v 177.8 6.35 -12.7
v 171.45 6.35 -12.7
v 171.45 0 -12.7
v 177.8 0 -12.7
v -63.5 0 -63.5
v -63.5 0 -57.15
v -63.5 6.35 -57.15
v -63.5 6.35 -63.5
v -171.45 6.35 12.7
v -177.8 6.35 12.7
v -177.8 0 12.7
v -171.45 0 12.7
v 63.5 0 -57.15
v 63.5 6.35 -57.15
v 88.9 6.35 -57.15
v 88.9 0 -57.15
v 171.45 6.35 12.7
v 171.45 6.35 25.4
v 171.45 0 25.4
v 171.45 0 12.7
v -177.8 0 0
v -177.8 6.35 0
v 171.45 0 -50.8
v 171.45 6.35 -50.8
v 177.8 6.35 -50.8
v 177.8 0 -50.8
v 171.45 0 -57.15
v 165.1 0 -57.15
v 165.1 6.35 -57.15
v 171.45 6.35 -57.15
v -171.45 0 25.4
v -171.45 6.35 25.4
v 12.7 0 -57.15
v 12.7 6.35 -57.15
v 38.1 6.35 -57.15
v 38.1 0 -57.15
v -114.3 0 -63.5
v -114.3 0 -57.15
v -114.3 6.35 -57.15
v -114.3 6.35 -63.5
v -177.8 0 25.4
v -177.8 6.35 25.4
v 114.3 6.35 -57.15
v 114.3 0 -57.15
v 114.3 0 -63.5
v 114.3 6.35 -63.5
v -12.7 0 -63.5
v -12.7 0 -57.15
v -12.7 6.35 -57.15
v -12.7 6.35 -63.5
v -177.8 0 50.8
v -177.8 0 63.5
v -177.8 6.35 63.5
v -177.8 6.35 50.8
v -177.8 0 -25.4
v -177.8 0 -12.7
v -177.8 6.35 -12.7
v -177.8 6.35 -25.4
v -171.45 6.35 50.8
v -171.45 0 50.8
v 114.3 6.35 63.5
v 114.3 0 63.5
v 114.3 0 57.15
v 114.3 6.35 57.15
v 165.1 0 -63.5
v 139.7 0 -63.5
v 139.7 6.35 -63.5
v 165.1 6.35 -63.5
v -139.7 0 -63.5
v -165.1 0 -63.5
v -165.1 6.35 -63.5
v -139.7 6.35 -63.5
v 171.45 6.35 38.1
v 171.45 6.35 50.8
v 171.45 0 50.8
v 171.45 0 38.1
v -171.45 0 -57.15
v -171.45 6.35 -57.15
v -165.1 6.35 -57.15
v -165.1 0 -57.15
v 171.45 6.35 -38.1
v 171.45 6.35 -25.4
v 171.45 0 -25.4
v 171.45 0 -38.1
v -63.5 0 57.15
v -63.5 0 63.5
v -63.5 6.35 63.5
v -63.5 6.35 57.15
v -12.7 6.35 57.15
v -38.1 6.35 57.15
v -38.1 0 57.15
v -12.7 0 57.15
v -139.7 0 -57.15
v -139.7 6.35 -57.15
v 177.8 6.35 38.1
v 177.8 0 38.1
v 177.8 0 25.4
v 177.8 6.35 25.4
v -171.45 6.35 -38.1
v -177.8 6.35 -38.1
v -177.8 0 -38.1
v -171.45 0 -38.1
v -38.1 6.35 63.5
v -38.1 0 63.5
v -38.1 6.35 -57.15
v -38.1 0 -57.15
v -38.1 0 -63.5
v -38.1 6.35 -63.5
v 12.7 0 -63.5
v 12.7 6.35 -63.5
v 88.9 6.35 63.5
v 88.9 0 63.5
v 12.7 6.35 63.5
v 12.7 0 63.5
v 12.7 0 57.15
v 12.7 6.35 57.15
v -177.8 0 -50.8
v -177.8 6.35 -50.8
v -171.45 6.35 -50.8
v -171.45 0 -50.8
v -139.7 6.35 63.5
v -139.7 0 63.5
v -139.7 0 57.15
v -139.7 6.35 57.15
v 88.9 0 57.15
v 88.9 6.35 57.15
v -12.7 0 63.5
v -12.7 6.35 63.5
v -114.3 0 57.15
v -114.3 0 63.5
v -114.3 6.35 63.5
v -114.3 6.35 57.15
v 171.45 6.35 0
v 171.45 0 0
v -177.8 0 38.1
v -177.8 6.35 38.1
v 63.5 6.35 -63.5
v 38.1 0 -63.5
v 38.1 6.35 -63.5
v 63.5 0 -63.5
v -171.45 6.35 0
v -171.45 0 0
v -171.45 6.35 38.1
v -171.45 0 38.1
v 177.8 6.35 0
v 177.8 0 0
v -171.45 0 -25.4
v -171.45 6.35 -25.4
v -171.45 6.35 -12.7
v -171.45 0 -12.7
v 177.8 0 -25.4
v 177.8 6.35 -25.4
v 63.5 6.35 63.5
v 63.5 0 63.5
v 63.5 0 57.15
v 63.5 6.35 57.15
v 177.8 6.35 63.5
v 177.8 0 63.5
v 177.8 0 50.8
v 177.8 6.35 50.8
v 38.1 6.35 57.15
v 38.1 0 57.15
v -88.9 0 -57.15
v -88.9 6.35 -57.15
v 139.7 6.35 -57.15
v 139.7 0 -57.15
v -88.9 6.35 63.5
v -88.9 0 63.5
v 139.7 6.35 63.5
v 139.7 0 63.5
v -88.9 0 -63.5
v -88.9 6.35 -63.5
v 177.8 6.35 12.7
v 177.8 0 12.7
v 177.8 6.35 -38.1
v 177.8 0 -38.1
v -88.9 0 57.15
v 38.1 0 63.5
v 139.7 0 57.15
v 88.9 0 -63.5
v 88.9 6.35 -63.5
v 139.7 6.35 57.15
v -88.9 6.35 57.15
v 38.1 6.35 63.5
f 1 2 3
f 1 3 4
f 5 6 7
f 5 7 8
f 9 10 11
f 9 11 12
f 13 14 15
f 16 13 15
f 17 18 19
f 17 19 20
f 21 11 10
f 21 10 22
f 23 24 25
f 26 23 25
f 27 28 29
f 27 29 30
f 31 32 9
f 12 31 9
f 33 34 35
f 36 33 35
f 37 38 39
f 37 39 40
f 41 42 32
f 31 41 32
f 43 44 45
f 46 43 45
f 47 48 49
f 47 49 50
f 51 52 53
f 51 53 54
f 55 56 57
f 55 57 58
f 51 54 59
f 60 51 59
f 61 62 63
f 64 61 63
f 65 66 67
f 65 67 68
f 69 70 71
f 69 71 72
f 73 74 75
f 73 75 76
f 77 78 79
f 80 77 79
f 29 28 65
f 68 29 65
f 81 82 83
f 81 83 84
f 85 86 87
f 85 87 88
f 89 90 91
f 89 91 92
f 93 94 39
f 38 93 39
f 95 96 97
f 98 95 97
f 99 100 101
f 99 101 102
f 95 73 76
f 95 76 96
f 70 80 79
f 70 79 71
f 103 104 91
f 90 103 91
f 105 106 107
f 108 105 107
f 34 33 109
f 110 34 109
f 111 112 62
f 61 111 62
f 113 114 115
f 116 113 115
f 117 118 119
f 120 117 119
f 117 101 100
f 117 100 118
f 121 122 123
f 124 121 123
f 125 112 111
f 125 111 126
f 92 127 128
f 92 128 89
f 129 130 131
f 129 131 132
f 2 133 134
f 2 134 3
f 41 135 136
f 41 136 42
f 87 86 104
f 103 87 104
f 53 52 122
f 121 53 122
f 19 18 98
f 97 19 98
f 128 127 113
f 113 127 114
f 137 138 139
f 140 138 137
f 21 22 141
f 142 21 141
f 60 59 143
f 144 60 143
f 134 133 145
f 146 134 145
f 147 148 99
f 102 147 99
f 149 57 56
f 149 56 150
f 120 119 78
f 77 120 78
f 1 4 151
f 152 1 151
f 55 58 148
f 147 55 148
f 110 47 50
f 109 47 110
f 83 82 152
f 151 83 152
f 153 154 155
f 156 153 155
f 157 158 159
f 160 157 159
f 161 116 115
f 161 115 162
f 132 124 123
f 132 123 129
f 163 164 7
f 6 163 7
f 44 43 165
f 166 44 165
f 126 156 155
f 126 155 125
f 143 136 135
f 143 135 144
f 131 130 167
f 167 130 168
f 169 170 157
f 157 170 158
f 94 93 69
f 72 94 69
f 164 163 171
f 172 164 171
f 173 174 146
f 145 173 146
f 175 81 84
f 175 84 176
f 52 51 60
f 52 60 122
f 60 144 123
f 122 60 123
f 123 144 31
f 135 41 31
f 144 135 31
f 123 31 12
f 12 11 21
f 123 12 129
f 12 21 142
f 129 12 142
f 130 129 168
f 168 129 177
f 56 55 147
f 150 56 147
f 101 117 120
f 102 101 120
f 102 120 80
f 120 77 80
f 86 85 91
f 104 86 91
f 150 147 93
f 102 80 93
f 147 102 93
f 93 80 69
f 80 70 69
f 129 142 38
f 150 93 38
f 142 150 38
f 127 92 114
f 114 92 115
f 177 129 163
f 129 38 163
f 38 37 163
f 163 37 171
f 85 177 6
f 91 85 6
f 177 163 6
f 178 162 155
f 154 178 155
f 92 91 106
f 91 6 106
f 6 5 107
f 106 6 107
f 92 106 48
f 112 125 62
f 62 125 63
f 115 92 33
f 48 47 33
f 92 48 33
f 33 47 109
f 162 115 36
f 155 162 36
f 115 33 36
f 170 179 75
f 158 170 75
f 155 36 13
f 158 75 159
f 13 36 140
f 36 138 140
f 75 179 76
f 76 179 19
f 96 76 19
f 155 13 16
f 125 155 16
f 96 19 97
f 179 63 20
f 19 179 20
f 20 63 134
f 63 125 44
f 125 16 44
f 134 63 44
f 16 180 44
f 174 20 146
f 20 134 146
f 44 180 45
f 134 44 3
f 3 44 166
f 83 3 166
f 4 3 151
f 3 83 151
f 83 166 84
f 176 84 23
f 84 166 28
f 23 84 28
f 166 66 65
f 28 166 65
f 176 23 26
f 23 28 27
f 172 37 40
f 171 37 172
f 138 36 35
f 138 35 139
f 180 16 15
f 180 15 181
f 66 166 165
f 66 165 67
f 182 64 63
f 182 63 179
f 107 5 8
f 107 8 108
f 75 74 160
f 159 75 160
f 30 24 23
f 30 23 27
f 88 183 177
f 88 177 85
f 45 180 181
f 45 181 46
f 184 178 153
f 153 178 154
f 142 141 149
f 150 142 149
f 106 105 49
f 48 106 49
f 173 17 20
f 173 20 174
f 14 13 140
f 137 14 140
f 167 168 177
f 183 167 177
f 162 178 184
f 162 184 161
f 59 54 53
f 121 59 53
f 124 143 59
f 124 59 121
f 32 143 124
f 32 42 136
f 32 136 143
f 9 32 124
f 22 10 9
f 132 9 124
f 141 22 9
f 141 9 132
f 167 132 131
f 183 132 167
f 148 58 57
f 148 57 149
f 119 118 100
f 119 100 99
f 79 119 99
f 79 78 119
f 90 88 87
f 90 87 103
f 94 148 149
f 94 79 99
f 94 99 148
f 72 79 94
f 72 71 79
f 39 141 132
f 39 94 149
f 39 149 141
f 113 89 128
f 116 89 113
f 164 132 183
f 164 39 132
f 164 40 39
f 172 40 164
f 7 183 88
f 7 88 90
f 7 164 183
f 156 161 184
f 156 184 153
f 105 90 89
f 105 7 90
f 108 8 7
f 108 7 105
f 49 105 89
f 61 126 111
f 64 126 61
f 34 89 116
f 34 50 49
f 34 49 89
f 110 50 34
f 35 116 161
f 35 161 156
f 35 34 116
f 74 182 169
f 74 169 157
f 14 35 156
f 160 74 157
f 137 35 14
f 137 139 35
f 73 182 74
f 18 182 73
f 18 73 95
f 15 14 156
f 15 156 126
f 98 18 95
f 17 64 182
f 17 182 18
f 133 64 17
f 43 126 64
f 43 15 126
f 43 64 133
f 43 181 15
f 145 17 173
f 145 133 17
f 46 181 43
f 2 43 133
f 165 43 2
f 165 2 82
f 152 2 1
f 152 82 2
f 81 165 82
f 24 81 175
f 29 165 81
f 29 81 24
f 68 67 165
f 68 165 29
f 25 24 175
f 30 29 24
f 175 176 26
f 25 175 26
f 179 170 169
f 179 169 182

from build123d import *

# Parameters (mm, degrees)
ESQUISSE1_W                     = 355.6
ESQUISSE1_H                     = 127
BOSS_EXTRU_1_DEPTH              = 6.35
ESQUISSE3_W                     = 25.4
ESQUISSE3_H                     = 6.35
ENL_V_MAT_EXTRU_2_DEPTH         = 6.35
ESQUISSE4_W                     = 6.35
ESQUISSE4_H                     = 12.7
ENL_V_MAT_EXTRU_3_DEPTH         = 25.4
R_P_TITION_LIN_AIRE1_COUNT      = 6
R_P_TITION_LIN_AIRE1_PITCH      = 50.8
R_P_TITION_LIN_AIRE1_COUNT_DIR2 = 2
R_P_TITION_LIN_AIRE1_PITCH_DIR2 = 120.65
R_P_TITION_LIN_AIRE3_COUNT      = 5
R_P_TITION_LIN_AIRE3_PITCH      = 25.4
R_P_TITION_LIN_AIRE3_COUNT_DIR2 = 2
R_P_TITION_LIN_AIRE3_PITCH_DIR2 = 349.25
ESQUISSE5_W                     = 12.7
ESQUISSE5_H                     = 6.35
ENL_V_MAT_EXTRU_4_DEPTH         = 6.35


with BuildPart() as part:
    # Esquisse1 → Boss.-Extru.1 (new body)
    with BuildSketch(Plane(origin=(0, 0, 0), x_dir=(1, 0, 0), z_dir=(0, 1, 0))):
        Rectangle(ESQUISSE1_W, ESQUISSE1_H)
    extrude(amount=BOSS_EXTRU_1_DEPTH)

    # Esquisse3 → Enlèv. mat.-Extru.2 (cut)
    with BuildSketch(Plane(origin=(0, 6.35, 0), x_dir=(1, 0, 0), z_dir=(0, 1, 0))):
        with Locations((-127, 60.325)):
            Rectangle(ESQUISSE3_W, ESQUISSE3_H)
    enl_v_mat_extru_2 = extrude(amount=-ENL_V_MAT_EXTRU_2_DEPTH, mode=Mode.SUBTRACT)

    # Esquisse4 → Enlèv. mat.-Extru.3 (cut)
    with BuildSketch(Plane(origin=(0, 6.35, 0), x_dir=(1, 0, 0), z_dir=(0, 1, 0))):
        with Locations((-174.625, 57.15)):
            Rectangle(ESQUISSE4_W, ESQUISSE4_H)
    enl_v_mat_extru_3 = extrude(amount=-ENL_V_MAT_EXTRU_3_DEPTH, mode=Mode.SUBTRACT)

    # Répétition linéaire1: Enl_v. mat.-Extru.2 6 × 2
    with Locations(*[(i * R_P_TITION_LIN_AIRE1_PITCH, 0, j * R_P_TITION_LIN_AIRE1_PITCH_DIR2) for i in range(R_P_TITION_LIN_AIRE1_COUNT) for j in range(R_P_TITION_LIN_AIRE1_COUNT_DIR2) if (i, j) != (0, 0)]):
        add(enl_v_mat_extru_2, mode=Mode.SUBTRACT)

    # Répétition linéaire3: Enl_v. mat.-Extru.3 5 × 2
    with Locations(*[(j * R_P_TITION_LIN_AIRE3_PITCH_DIR2, 0, i * R_P_TITION_LIN_AIRE3_PITCH) for i in range(R_P_TITION_LIN_AIRE3_COUNT) for j in range(R_P_TITION_LIN_AIRE3_COUNT_DIR2) if (i, j) != (0, 0)]):
        add(enl_v_mat_extru_3, mode=Mode.SUBTRACT)

    # Esquisse5 → Enlèv. mat.-Extru.4 (cut)
    with BuildSketch(Plane(origin=(0, 6.35, 0), x_dir=(1, 0, 0), z_dir=(0, 1, 0))):
        with Locations((-171.45, 60.325)):
            Rectangle(ESQUISSE5_W, ESQUISSE5_H)
        with Locations((171.45, 60.325)):
            Rectangle(ESQUISSE5_W, ESQUISSE5_H)
    extrude(amount=-ENL_V_MAT_EXTRU_4_DEPTH, mode=Mode.SUBTRACT)


solid = part.part
